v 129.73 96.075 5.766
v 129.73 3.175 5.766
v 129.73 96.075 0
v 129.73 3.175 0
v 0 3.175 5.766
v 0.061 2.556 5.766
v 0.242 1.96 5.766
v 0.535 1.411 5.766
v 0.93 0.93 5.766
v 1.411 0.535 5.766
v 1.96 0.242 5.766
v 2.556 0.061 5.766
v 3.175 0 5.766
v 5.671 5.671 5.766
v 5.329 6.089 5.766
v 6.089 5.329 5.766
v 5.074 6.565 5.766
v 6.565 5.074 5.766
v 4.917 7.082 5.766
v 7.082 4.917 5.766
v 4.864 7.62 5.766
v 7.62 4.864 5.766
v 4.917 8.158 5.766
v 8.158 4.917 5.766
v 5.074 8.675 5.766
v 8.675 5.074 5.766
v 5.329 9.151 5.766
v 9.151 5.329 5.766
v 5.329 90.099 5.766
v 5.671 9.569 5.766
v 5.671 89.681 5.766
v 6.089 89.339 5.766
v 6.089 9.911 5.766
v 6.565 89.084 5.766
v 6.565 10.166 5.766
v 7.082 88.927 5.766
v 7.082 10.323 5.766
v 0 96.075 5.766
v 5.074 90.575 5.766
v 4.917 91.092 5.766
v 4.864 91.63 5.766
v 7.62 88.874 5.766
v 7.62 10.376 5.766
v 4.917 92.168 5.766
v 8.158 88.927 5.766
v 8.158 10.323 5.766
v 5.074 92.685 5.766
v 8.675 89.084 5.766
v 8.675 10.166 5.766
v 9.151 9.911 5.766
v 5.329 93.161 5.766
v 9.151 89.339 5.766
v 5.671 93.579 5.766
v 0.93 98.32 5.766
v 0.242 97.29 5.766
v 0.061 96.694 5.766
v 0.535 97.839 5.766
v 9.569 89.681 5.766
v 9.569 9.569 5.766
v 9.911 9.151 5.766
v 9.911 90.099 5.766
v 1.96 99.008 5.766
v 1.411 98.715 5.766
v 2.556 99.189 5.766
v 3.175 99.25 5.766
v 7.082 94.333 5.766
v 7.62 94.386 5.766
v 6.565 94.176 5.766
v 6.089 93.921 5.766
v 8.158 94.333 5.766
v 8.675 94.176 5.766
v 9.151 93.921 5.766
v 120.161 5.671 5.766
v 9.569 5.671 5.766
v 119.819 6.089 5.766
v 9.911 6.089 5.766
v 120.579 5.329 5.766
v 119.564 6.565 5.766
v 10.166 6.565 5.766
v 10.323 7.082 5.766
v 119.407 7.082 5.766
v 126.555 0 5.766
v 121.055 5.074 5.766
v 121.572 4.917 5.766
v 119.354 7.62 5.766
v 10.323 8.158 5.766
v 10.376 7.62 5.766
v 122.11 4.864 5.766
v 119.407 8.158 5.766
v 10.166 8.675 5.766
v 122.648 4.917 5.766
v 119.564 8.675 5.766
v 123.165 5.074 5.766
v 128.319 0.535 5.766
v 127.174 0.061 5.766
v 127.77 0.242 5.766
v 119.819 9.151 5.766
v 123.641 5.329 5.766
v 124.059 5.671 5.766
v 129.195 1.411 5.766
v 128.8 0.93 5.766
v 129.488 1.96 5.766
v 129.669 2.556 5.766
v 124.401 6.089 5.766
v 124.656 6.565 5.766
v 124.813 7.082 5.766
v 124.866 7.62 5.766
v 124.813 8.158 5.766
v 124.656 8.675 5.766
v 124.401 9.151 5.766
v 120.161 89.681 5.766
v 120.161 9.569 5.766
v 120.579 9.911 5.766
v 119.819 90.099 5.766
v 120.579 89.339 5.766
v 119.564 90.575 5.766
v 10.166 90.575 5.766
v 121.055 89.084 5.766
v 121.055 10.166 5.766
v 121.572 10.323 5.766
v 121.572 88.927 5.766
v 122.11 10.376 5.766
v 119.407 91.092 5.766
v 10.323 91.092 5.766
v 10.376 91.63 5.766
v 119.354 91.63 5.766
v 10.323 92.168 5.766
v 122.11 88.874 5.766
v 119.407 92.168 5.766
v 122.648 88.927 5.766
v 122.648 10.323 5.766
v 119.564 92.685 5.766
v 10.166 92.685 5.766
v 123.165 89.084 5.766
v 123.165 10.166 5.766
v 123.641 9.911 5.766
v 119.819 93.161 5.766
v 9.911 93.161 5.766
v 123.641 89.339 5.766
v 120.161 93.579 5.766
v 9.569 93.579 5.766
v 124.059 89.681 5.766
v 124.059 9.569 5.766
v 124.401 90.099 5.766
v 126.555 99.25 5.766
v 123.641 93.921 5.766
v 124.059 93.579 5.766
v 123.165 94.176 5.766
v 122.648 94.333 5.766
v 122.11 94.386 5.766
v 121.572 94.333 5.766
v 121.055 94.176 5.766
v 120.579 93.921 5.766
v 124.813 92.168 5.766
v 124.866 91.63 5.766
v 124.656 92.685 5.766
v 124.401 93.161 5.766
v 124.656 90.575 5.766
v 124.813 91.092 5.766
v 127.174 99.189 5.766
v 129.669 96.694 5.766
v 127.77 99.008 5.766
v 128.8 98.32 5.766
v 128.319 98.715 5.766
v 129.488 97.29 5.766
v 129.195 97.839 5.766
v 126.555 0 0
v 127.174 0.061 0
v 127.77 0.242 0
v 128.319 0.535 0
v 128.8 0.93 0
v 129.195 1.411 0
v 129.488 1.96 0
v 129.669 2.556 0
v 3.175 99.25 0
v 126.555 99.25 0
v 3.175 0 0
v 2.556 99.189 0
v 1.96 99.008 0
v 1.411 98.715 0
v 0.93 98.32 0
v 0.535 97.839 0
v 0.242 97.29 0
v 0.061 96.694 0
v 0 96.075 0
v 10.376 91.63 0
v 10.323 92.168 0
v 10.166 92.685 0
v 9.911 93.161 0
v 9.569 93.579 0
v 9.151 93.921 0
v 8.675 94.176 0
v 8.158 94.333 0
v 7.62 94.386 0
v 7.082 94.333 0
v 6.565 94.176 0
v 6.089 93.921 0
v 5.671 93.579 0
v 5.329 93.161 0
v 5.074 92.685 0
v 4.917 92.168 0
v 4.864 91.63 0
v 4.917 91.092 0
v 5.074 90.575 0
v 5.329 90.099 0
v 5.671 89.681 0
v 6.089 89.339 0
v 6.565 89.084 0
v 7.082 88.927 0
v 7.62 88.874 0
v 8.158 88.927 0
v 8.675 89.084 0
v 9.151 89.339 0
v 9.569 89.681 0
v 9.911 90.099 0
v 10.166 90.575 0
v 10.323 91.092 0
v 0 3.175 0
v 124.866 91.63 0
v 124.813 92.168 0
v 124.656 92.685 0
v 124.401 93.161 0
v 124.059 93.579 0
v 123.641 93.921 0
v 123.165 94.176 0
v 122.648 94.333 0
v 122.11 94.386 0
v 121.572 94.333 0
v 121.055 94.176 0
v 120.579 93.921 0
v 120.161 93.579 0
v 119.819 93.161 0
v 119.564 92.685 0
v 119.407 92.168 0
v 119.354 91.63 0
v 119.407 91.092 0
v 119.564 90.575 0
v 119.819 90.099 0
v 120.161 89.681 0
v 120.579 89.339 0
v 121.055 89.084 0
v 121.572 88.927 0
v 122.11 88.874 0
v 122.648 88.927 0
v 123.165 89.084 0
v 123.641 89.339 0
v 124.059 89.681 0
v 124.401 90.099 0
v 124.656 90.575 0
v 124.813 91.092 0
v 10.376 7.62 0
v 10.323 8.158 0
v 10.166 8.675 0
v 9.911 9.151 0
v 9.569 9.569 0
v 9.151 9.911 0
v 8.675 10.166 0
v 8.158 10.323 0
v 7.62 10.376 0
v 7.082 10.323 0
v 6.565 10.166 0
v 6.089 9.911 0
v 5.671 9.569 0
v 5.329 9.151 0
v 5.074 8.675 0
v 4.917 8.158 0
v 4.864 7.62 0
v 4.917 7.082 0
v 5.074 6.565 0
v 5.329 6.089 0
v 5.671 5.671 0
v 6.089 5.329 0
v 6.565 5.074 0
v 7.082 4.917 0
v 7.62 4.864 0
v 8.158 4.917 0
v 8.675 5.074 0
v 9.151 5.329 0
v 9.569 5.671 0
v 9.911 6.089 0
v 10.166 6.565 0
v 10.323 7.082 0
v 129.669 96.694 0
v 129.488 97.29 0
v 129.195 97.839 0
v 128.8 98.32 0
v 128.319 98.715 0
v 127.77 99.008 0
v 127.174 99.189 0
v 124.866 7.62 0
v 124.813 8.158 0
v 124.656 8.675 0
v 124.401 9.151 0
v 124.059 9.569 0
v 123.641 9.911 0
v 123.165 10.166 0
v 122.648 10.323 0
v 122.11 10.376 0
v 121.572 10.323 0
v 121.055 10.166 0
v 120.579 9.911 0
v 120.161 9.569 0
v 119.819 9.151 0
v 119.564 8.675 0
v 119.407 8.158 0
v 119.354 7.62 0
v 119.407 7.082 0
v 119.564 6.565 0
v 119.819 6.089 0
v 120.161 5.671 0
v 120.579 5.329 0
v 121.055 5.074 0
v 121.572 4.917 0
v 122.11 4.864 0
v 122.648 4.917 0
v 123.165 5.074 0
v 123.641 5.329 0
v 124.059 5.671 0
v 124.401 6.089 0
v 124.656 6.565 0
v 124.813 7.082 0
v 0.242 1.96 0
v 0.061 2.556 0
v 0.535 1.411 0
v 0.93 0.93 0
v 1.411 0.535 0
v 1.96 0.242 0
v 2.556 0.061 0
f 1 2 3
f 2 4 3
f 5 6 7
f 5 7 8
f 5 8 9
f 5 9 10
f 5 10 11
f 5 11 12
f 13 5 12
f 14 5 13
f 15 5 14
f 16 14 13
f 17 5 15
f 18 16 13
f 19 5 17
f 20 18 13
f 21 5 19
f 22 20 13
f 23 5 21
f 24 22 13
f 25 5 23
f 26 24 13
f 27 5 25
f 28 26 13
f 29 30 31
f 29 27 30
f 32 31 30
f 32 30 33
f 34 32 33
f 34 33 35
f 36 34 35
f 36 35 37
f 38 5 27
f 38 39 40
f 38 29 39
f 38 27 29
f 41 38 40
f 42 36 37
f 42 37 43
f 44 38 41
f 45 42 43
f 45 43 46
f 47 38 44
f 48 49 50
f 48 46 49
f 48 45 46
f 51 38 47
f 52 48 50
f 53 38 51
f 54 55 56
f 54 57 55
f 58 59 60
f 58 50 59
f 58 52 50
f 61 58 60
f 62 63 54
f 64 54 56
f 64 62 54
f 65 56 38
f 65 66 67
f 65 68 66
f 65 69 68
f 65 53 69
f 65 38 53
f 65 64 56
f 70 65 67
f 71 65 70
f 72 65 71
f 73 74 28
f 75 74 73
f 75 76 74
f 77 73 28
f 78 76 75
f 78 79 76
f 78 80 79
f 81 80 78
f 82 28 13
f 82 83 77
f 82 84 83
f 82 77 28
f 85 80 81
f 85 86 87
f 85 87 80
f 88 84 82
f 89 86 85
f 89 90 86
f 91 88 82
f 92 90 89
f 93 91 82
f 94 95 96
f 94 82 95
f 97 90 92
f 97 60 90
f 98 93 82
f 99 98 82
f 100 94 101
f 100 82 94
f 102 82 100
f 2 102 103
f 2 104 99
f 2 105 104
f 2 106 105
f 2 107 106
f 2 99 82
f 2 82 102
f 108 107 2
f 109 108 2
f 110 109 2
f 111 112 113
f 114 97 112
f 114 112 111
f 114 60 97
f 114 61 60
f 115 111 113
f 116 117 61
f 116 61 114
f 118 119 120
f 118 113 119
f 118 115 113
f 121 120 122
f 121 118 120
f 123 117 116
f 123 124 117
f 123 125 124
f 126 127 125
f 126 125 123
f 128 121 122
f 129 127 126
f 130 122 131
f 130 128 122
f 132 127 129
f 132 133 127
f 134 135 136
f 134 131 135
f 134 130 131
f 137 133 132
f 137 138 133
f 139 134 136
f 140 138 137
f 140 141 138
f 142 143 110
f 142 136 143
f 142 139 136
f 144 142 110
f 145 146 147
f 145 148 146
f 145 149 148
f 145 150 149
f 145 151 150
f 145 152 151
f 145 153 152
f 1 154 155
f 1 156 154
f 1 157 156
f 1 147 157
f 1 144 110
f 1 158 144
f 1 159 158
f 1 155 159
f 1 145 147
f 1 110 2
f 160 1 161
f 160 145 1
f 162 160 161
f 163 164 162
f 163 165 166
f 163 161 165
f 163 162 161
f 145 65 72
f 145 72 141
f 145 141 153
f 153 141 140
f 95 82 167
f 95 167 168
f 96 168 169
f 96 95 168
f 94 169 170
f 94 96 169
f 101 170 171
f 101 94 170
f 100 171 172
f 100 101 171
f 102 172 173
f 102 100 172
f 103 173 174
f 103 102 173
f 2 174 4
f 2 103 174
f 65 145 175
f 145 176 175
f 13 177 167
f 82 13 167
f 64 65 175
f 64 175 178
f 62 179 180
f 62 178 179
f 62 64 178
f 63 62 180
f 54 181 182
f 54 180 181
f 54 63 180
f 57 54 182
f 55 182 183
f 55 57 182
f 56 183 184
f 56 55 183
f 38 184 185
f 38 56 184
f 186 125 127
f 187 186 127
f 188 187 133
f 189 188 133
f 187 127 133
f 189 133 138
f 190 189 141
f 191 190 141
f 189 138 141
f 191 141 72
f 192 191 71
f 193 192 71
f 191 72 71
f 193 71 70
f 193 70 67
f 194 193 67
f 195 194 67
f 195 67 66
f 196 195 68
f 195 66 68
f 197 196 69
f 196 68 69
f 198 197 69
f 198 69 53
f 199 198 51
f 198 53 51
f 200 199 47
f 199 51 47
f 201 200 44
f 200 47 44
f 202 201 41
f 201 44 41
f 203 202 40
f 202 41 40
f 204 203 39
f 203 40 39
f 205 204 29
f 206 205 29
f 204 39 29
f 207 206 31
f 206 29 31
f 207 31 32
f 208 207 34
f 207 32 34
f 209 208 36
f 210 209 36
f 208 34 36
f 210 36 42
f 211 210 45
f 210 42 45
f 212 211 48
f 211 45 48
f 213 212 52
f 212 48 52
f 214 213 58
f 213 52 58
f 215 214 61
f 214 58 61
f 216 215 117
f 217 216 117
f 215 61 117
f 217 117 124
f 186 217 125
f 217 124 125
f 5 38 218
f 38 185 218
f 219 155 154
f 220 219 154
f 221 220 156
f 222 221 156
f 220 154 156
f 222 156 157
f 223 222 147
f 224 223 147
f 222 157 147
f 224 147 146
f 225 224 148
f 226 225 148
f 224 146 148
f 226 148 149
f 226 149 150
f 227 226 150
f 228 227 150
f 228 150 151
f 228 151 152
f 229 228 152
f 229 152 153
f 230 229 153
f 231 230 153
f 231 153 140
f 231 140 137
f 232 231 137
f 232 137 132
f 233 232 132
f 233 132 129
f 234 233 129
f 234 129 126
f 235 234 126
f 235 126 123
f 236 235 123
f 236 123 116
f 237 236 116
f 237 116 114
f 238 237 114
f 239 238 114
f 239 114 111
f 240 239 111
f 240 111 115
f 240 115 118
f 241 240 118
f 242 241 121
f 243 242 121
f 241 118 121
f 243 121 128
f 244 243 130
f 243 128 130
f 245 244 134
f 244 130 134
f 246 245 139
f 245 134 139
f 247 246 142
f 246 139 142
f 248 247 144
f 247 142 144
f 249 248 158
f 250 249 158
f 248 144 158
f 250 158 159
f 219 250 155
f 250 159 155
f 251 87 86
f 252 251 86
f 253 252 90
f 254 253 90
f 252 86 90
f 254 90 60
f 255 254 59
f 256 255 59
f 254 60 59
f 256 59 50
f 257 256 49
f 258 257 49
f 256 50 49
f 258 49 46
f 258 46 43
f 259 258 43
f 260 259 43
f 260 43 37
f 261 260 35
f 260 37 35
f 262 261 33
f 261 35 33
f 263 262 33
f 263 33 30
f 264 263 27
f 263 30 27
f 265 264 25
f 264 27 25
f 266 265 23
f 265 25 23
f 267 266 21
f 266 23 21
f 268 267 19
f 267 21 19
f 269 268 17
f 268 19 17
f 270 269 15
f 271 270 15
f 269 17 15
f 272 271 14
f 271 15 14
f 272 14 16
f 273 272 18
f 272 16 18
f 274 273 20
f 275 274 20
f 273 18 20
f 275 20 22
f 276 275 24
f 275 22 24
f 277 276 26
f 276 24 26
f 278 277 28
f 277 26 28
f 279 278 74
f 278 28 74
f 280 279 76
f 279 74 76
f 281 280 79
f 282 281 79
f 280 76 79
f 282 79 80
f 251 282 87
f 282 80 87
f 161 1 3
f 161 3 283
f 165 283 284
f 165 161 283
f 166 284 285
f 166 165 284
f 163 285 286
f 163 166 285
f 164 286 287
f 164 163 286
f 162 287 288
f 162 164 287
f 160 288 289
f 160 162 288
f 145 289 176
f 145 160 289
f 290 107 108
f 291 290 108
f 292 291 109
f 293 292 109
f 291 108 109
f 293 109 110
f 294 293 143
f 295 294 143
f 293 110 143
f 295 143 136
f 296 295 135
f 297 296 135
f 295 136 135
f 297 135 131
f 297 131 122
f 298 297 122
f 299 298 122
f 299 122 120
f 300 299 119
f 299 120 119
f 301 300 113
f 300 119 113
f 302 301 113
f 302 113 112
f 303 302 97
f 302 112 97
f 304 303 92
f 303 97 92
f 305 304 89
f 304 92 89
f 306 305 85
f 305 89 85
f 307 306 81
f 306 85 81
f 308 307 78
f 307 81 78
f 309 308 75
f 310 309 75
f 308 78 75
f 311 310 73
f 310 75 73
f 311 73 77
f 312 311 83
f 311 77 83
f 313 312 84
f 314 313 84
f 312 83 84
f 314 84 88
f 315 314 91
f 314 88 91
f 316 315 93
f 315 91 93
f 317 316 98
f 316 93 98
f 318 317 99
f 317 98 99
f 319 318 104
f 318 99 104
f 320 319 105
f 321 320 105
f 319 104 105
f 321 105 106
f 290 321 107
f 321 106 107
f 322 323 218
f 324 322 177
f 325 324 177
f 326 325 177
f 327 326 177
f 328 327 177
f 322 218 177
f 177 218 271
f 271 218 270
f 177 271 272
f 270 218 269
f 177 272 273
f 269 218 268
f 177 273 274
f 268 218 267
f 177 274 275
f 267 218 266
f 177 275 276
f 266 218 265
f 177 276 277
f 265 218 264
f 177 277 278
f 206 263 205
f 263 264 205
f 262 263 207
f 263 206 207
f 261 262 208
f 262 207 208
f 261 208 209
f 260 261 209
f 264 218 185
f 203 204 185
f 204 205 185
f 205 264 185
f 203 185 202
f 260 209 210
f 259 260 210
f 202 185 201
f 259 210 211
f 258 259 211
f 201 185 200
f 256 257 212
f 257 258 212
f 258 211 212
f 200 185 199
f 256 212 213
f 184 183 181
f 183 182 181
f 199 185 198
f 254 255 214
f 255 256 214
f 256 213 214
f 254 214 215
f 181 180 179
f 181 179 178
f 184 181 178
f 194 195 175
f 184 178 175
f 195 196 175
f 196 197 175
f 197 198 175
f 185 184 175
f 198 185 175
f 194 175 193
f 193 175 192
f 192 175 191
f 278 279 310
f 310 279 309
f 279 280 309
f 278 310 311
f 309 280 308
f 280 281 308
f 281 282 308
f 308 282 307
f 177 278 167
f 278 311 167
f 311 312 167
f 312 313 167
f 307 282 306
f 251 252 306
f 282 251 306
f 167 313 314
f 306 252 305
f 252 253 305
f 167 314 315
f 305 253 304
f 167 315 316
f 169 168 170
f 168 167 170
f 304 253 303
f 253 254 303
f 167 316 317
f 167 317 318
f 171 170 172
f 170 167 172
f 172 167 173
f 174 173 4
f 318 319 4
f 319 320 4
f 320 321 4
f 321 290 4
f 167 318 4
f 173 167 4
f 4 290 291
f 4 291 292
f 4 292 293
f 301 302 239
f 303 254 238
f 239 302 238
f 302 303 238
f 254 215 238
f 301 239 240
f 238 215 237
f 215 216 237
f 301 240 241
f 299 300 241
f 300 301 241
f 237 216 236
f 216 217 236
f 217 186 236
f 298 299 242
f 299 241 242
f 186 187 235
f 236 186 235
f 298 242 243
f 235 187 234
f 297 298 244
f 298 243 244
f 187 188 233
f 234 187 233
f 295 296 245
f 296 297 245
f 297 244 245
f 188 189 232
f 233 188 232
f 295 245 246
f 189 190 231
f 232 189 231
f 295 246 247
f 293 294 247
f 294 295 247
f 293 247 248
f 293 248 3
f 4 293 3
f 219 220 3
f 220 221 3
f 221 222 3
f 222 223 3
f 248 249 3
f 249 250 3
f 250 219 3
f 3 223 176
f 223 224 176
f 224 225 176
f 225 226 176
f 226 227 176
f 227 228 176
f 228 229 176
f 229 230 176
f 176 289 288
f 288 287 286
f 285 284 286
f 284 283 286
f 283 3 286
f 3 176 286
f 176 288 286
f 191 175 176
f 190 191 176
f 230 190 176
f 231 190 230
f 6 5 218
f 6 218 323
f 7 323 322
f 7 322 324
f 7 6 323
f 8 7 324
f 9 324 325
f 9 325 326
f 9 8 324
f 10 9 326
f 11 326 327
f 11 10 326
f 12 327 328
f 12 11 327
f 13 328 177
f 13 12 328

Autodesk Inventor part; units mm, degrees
ref_plane "YZ Plane" through (0, 0, 0) normal (1, 0, 0) x (0, 1, 0)
ref_plane "XZ Plane" through (0, 0, 0) normal (0, 1, 0) x (-1, 0, 0)
ref_plane "XY Plane" through (0, 0, 0) normal (0, 0, 1) x (1, 0, 0)
sketch "Sketch1" plane through (0, 0, 0) normal (0, 0, 1) x (1, 0, 0)
  line L0 (0, 0) -> (129.73, 0)
  line L1 (129.73, 0) -> (129.73, 99.25)
  line L2 (129.73, 99.25) -> (0, 99.25)
  line L3 (0, 99.25) -> (0, 0)
  dimension "d0" = 129.73
  dimension "d1" = 99.25
extrude "Extrusion1" add sketch "Sketch1" along normal blind 5.7658
fillet "Fillet1" radius 3.175 4 edges at (129.73, 99.25, 2.8829) (0, 99.25, 2.8829) (0, 0, 2.8829) (129.73, 0, 2.8829)
sketch "Sketch2" plane through (0, 0, 5.7658) normal (0, 0, 1) x (1, 0, 0)
  circle A0 centre (7.62, 91.63) radius 2.7559
  circle A1 centre (122.11, 91.63) radius 2.7559
  circle A2 centre (122.11, 7.62) radius 2.7559
  circle A3 centre (7.62, 7.62) radius 2.7559
  line L0 (0, 96.075) -> (0, 3.175) projected
  line L1 (126.555, 99.25) -> (3.175, 99.25) projected
  line L2 (129.73, 3.175) -> (129.73, 96.075) projected
  line L3 (3.175, 0) -> (126.555, 0) projected
  point P0 (0, 0)
  dimension "d5" = 7.62
  dimension "d6" = 7.62
  dimension "d7" = 7.62
  dimension "d8" = 7.62
  dimension "d9" = 7.62
  dimension "d10" = 7.62
  dimension "d11" = 5.5118
  dimension "d12" = 5.5118
  dimension "d13" = 5.5118
  dimension "d14" = 7.62
  dimension "d15" = 7.62
  dimension "d16" = 5.5118
extrude "Extrusion2" cut sketch "Sketch2" against normal through all
properties part number "PowerBoardCaseCover" material "Polycarbonate, Clear"
